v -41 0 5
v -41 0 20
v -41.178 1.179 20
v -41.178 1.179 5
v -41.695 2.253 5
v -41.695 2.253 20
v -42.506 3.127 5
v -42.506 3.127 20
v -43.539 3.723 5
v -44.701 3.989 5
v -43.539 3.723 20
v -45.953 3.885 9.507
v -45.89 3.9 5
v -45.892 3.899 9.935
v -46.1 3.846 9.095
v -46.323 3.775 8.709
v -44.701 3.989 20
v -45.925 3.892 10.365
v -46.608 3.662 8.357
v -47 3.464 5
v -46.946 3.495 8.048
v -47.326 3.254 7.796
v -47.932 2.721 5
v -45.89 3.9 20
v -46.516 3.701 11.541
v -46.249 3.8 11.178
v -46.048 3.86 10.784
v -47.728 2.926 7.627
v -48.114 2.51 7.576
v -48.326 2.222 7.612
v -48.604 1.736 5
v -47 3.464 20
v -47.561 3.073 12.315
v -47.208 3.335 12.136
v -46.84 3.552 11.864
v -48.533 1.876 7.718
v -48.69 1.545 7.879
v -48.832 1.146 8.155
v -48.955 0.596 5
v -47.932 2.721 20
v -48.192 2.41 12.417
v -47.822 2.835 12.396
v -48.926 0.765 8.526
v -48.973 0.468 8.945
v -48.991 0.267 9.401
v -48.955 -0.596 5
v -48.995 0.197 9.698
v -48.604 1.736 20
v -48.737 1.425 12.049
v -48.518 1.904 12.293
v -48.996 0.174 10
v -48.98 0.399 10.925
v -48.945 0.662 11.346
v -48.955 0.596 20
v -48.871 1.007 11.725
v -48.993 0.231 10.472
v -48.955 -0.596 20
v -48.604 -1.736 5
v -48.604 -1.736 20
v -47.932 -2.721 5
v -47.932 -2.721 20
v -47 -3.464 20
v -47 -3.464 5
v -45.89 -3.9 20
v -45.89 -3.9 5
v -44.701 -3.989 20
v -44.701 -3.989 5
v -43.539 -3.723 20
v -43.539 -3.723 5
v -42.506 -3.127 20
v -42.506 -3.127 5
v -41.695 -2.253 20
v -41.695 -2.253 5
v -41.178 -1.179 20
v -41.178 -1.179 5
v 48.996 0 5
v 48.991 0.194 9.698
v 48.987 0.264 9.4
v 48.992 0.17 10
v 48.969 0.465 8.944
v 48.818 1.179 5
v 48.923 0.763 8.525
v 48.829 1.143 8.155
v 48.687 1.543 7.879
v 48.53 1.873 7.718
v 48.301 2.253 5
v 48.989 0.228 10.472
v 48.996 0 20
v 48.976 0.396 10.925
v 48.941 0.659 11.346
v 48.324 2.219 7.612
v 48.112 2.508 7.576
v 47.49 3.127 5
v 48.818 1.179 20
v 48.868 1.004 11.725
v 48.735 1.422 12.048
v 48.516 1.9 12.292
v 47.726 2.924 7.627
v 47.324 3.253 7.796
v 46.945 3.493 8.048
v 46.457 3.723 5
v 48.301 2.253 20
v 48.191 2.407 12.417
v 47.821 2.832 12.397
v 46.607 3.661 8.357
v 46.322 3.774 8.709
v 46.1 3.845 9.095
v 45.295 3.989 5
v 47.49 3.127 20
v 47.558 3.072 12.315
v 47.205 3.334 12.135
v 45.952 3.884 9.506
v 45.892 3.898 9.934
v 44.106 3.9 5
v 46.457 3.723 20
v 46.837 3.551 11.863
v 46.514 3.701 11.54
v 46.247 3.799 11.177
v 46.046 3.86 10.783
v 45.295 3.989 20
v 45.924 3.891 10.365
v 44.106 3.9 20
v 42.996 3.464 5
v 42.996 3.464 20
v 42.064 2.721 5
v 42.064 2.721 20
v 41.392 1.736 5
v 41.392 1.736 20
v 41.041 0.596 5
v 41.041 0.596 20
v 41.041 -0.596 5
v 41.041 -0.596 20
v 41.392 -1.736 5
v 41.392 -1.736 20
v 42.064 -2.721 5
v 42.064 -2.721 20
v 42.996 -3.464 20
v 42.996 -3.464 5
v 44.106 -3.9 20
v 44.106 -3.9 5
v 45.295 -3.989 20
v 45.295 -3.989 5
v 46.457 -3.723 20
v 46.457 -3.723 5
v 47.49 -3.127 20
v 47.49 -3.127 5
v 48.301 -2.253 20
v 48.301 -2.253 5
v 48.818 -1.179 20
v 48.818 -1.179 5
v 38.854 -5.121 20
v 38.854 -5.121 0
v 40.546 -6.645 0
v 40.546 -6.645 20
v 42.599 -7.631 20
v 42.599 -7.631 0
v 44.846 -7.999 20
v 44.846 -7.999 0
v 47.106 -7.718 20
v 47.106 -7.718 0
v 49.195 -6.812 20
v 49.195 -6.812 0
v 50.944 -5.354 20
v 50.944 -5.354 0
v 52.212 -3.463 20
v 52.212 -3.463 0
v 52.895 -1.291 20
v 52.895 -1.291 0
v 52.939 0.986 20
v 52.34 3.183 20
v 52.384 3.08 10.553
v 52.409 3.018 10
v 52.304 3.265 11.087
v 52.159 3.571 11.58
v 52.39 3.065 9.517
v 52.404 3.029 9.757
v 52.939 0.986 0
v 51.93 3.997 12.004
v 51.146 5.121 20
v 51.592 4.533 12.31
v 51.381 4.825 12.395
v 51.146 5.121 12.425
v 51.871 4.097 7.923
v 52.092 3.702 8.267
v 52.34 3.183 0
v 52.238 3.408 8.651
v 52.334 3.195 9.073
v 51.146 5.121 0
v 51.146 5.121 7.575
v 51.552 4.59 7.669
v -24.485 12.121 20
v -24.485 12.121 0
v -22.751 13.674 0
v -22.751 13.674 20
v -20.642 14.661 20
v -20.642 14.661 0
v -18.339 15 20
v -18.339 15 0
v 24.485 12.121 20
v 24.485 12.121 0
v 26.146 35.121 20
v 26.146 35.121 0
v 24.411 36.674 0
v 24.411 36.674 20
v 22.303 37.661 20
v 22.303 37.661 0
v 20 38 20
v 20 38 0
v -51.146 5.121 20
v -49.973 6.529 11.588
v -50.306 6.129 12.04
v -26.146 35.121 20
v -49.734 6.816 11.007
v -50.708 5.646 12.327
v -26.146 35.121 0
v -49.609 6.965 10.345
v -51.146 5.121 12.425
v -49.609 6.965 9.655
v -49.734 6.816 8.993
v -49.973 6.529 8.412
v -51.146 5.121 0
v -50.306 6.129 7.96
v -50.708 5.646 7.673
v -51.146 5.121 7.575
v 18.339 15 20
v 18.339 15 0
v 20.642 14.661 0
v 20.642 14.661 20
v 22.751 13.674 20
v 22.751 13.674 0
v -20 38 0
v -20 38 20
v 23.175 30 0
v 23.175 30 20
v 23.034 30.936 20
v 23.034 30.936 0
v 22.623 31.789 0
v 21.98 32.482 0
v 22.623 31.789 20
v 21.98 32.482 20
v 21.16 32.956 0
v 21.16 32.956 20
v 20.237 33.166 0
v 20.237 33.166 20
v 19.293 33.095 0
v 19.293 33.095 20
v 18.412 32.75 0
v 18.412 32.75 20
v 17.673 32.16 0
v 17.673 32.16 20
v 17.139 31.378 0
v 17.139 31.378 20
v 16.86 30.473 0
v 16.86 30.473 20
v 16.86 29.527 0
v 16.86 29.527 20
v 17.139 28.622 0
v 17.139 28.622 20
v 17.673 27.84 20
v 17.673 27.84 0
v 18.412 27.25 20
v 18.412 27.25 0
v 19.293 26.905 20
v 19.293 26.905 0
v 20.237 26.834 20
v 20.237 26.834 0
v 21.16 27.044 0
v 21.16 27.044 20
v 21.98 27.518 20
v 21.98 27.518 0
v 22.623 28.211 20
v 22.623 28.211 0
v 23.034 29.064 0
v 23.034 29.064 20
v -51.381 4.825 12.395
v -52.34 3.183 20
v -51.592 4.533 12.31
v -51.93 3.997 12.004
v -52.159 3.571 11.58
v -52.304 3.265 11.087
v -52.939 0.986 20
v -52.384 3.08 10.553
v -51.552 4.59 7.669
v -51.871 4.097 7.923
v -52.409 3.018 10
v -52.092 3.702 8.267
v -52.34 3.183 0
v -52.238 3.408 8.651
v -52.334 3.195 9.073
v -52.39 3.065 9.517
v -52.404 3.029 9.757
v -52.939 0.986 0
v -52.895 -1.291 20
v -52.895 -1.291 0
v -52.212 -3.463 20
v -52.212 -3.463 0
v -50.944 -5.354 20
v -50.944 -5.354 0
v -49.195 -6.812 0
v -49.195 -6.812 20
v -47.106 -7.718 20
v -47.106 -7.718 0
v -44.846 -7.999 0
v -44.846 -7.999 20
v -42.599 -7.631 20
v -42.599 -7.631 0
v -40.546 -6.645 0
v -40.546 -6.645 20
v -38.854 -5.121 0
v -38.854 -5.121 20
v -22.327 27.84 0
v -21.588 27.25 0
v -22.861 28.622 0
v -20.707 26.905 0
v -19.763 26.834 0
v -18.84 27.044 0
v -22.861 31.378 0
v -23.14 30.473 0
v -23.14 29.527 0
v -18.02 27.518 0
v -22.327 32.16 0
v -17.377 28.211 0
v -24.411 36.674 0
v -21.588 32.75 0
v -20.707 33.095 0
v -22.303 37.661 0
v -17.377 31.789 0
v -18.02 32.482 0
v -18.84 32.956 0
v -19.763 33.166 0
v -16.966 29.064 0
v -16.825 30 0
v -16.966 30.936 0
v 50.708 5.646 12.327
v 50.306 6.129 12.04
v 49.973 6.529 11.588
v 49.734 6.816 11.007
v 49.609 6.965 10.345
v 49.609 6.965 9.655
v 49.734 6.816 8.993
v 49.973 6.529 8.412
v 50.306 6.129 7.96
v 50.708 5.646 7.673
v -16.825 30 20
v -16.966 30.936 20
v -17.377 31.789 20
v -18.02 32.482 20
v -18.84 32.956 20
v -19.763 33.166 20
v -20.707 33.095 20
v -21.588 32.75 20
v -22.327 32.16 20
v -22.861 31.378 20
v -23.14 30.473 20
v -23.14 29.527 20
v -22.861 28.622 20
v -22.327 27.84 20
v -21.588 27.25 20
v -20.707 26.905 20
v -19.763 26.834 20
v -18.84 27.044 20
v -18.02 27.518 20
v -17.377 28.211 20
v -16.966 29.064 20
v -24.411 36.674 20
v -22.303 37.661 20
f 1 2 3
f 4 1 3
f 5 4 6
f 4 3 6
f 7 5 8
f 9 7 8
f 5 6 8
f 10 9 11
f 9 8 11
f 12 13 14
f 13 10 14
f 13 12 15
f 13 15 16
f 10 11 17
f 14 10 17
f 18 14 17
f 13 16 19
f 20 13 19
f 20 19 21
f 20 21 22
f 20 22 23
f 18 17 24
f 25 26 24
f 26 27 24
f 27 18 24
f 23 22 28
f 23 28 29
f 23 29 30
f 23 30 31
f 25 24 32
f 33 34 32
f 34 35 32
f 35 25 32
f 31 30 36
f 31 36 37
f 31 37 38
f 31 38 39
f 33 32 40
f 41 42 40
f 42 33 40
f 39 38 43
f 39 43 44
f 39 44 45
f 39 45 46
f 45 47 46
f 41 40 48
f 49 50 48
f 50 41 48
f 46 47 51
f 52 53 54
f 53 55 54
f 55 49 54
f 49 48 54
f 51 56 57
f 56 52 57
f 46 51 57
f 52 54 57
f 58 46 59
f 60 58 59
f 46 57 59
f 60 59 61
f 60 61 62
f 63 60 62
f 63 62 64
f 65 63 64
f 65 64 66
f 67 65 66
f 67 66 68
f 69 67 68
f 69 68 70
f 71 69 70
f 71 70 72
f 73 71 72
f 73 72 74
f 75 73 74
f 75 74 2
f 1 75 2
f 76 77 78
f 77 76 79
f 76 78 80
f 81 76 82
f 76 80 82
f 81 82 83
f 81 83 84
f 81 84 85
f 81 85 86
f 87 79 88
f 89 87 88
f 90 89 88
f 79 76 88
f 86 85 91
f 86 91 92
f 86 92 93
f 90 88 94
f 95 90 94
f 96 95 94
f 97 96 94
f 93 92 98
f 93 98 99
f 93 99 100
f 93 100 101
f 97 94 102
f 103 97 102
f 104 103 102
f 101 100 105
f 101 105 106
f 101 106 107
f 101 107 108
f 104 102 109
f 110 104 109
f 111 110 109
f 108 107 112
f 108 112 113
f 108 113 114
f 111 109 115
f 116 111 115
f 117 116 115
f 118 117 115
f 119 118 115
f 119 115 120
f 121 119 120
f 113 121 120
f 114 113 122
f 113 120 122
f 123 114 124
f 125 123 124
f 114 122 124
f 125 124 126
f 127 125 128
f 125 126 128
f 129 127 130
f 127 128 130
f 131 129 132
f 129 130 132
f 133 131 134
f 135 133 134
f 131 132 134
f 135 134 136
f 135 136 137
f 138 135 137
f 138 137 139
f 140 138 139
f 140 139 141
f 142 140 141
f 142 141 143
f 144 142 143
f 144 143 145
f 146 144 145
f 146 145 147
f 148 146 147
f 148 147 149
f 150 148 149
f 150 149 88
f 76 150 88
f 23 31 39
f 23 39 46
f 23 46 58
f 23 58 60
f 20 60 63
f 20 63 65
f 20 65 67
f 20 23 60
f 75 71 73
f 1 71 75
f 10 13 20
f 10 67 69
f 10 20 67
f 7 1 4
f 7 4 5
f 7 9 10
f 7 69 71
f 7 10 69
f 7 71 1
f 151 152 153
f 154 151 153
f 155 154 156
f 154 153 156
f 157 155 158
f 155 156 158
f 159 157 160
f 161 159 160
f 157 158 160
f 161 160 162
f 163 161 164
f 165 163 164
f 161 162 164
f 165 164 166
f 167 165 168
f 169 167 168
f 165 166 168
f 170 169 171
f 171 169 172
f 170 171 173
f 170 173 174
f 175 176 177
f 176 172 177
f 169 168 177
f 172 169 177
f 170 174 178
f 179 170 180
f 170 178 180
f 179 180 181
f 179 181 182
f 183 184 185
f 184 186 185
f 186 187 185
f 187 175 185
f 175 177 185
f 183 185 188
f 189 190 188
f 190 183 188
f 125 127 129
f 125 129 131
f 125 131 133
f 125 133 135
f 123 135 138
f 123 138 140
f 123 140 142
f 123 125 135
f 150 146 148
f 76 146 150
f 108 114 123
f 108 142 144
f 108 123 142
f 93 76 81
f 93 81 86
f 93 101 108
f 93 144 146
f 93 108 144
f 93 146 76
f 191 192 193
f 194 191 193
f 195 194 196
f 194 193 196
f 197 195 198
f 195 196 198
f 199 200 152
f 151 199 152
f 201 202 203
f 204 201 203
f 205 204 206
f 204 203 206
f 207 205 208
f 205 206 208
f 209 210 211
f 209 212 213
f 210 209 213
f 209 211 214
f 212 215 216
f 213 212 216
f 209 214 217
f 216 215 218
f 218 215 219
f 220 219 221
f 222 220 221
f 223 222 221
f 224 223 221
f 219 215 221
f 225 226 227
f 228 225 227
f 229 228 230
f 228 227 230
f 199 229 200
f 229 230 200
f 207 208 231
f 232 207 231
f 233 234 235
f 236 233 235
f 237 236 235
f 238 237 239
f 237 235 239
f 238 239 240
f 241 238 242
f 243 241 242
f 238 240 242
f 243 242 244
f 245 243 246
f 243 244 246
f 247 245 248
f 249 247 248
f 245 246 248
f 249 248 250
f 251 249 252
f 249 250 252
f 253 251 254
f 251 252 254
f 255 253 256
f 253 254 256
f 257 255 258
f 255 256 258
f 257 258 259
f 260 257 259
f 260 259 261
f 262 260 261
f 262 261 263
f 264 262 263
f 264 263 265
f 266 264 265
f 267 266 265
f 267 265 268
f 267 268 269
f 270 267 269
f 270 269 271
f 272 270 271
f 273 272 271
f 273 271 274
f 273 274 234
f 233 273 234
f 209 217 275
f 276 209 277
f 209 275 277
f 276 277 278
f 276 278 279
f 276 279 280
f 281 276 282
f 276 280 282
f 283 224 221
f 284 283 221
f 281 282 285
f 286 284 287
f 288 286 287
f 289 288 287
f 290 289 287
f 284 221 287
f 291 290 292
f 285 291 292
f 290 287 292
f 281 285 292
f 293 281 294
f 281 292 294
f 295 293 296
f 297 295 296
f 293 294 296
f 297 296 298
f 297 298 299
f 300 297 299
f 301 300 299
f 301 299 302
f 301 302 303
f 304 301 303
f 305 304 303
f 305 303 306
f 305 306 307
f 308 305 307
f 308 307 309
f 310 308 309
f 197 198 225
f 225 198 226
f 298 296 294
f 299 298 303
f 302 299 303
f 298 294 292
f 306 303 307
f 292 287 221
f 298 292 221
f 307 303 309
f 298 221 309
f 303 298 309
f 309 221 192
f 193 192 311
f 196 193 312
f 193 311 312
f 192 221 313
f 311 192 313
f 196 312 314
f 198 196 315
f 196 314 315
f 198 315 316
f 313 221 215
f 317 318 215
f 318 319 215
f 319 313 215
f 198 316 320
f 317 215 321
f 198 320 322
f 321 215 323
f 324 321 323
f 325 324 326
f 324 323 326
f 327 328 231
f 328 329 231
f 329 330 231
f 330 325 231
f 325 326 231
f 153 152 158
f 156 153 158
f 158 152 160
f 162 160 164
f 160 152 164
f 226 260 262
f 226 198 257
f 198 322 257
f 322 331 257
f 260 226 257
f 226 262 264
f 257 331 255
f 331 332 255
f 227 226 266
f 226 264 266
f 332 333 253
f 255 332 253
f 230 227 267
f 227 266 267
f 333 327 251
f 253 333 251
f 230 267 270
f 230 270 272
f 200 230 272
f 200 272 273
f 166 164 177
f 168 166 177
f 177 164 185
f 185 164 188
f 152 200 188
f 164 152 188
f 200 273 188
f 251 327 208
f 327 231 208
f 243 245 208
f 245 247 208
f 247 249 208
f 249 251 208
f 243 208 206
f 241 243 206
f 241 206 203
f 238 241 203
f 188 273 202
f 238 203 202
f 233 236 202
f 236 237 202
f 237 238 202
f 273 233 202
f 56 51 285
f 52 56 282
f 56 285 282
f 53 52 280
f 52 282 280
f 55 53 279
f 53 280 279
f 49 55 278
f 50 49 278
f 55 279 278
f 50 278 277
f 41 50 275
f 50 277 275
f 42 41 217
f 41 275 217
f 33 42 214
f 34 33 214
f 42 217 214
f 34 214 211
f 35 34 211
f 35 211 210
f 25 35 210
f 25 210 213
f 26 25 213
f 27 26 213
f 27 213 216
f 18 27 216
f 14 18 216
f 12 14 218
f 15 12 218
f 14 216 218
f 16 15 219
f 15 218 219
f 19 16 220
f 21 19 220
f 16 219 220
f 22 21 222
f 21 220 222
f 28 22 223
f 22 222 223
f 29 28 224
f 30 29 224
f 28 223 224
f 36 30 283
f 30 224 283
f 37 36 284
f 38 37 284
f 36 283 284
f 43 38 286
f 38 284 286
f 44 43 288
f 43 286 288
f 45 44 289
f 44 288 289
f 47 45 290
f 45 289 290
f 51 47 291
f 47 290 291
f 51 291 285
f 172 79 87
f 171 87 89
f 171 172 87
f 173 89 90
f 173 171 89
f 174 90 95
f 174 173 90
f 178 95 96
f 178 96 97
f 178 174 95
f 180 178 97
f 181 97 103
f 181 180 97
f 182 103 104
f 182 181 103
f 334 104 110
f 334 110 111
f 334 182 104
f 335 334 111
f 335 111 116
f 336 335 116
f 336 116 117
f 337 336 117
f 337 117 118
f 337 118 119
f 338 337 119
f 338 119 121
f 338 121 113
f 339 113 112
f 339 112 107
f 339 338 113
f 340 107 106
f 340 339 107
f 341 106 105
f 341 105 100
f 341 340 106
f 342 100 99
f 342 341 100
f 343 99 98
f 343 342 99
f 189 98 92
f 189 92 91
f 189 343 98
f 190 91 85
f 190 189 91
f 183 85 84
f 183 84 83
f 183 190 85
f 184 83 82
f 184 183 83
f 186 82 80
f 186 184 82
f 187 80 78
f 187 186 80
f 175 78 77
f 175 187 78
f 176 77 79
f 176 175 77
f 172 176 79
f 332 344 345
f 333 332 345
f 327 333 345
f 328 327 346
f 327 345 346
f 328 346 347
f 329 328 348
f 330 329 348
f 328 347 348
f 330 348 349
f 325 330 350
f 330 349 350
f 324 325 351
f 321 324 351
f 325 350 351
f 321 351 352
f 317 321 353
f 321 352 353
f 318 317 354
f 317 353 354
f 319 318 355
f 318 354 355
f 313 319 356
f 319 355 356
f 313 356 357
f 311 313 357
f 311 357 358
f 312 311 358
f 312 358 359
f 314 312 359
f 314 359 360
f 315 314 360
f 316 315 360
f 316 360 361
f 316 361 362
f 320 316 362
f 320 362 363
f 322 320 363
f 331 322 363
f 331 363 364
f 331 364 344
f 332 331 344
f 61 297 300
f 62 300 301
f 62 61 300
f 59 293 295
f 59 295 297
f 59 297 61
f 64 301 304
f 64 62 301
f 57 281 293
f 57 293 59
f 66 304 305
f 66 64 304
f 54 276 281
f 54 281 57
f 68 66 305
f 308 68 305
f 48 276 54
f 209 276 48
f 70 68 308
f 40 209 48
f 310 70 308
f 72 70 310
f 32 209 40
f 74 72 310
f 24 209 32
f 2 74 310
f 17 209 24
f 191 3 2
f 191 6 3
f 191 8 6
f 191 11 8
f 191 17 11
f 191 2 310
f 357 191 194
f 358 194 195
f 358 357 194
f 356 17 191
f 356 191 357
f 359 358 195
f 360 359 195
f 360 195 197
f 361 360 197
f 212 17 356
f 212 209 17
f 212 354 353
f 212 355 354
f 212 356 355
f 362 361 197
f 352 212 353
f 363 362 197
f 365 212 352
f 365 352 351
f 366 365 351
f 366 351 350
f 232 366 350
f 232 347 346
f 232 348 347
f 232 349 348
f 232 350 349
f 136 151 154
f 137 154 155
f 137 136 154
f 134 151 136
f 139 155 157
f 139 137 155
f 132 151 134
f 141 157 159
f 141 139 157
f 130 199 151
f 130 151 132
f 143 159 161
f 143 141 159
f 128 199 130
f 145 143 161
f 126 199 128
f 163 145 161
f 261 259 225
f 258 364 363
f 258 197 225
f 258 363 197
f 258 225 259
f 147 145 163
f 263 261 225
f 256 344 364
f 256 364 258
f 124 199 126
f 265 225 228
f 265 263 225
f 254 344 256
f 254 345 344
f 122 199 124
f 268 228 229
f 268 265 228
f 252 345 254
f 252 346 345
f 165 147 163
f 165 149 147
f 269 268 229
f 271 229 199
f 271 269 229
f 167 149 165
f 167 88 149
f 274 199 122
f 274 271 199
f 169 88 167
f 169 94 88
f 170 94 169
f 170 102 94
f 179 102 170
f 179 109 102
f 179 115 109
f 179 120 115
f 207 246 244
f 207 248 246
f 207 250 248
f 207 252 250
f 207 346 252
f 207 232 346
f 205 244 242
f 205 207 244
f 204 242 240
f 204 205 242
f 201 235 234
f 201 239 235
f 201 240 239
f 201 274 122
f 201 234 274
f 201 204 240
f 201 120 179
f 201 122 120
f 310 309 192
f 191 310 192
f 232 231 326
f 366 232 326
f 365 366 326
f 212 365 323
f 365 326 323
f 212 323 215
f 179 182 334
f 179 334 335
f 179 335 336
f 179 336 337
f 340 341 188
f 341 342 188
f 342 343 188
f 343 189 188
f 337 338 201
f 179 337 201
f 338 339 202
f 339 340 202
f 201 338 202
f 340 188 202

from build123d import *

# Parameters (mm, degrees)
BOSS_EXTRUDE1_DEPTH = 20
SKETCH2_R           = 4
CUT_EXTRUDE1_DEPTH  = 15
SKETCH6_R           = 2.425
CUT_EXTRUDE5_DEPTH  = 6
CUT_EXTRUDE6_REACH  = 70.213
SKETCH7_R           = 3.175


with BuildPart() as part:
    # Sketch1 → Boss-Extrude1 (new body)
    with BuildSketch(Plane.XY):
        with BuildLine():
            Line((-26.145770237, 35.121475197), (-51.145770237, 5.121475197))
            ThreePointArc((-51.145770237, 5.121475197), (-50.121475197, -6.145770237), (-38.854229763, -5.121475197))
            Line((-38.854229763, -5.121475197), (-24.485104434, 12.121475197))
            ThreePointArc((-24.485104434, 12.121475197), (-21.732577368, 14.24471537), (-18.339334198, 15))
            Line((-18.339334198, 15), (18.339334198, 15))
            ThreePointArc((18.339334198, 15), (21.732577368, 14.24471537), (24.485104434, 12.121475197))
            Line((24.485104434, 12.121475197), (38.854229763, -5.121475197))
            ThreePointArc((38.854229763, -5.121475197), (50.121475197, -6.145770237), (51.145770237, 5.121475197))
            Line((51.145770237, 5.121475197), (26.145770237, 35.121475197))
            ThreePointArc((26.145770237, 35.121475197), (23.39324317, 37.24471537), (20, 38))
            Line((20, 38), (-20, 38))
            ThreePointArc((-20, 38), (-23.39324317, 37.24471537), (-26.145770237, 35.121475197))
        make_face()
    extrude(amount=BOSS_EXTRUDE1_DEPTH)

    # Sketch2 → Cut-Extrude1 (cut)
    with BuildSketch(Plane.XY.offset(20)):
        with Locations((-45, 0)):
            Circle(SKETCH2_R)
        with Locations((44.995948223, 0)):
            Circle(SKETCH2_R)
    extrude(amount=-CUT_EXTRUDE1_DEPTH, mode=Mode.SUBTRACT)

    # Sketch6 → Cut-Extrude5 (cut)
    with BuildSketch(Plane(origin=(-32.703147286, 27.252622738, 0), x_dir=(0, 0, 1), z_dir=(-0.7682212795973757, 0.6401843996644799, 0))):
        with Locations(Location((10, -28.808297985, 0), (0, 0, 270))):
            Circle(SKETCH6_R)
    cut_extrude5 = extrude(amount=-CUT_EXTRUDE5_DEPTH, mode=Mode.SUBTRACT)

    # Mirror2: Cut-Extrude5 across plane
    add(cut_extrude5.mirror(Plane(origin=(0, 0, 0), x_dir=(0, 0, 1), z_dir=(1, 0, 0))), mode=Mode.SUBTRACT)

    # Sketch7 → Cut-Extrude6 (cut, up to next)
    with BuildSketch(Plane.XY.offset(20), mode=Mode.PRIVATE) as cut_extrude6_sk1:
        with Locations((-20, 30)):
            Circle(SKETCH7_R)
    cut_extrude6_tool1 = extrude(cut_extrude6_sk1.sketch, amount=-CUT_EXTRUDE6_REACH, mode=Mode.PRIVATE) & part.part
    # Sketch7 → Cut-Extrude6 (cut, up to next)
    with BuildSketch(Plane.XY.offset(20), mode=Mode.PRIVATE) as cut_extrude6_sk2:
        with Locations((20, 30)):
            Circle(SKETCH7_R)
    cut_extrude6_tool2 = extrude(cut_extrude6_sk2.sketch, amount=-CUT_EXTRUDE6_REACH, mode=Mode.PRIVATE) & part.part
    add(cut_extrude6_tool1.solids().sort_by_distance((-20, 30, 20))[0], mode=Mode.SUBTRACT)
    add(cut_extrude6_tool2.solids().sort_by_distance((20, 30, 20))[0], mode=Mode.SUBTRACT)


solid = part.part
